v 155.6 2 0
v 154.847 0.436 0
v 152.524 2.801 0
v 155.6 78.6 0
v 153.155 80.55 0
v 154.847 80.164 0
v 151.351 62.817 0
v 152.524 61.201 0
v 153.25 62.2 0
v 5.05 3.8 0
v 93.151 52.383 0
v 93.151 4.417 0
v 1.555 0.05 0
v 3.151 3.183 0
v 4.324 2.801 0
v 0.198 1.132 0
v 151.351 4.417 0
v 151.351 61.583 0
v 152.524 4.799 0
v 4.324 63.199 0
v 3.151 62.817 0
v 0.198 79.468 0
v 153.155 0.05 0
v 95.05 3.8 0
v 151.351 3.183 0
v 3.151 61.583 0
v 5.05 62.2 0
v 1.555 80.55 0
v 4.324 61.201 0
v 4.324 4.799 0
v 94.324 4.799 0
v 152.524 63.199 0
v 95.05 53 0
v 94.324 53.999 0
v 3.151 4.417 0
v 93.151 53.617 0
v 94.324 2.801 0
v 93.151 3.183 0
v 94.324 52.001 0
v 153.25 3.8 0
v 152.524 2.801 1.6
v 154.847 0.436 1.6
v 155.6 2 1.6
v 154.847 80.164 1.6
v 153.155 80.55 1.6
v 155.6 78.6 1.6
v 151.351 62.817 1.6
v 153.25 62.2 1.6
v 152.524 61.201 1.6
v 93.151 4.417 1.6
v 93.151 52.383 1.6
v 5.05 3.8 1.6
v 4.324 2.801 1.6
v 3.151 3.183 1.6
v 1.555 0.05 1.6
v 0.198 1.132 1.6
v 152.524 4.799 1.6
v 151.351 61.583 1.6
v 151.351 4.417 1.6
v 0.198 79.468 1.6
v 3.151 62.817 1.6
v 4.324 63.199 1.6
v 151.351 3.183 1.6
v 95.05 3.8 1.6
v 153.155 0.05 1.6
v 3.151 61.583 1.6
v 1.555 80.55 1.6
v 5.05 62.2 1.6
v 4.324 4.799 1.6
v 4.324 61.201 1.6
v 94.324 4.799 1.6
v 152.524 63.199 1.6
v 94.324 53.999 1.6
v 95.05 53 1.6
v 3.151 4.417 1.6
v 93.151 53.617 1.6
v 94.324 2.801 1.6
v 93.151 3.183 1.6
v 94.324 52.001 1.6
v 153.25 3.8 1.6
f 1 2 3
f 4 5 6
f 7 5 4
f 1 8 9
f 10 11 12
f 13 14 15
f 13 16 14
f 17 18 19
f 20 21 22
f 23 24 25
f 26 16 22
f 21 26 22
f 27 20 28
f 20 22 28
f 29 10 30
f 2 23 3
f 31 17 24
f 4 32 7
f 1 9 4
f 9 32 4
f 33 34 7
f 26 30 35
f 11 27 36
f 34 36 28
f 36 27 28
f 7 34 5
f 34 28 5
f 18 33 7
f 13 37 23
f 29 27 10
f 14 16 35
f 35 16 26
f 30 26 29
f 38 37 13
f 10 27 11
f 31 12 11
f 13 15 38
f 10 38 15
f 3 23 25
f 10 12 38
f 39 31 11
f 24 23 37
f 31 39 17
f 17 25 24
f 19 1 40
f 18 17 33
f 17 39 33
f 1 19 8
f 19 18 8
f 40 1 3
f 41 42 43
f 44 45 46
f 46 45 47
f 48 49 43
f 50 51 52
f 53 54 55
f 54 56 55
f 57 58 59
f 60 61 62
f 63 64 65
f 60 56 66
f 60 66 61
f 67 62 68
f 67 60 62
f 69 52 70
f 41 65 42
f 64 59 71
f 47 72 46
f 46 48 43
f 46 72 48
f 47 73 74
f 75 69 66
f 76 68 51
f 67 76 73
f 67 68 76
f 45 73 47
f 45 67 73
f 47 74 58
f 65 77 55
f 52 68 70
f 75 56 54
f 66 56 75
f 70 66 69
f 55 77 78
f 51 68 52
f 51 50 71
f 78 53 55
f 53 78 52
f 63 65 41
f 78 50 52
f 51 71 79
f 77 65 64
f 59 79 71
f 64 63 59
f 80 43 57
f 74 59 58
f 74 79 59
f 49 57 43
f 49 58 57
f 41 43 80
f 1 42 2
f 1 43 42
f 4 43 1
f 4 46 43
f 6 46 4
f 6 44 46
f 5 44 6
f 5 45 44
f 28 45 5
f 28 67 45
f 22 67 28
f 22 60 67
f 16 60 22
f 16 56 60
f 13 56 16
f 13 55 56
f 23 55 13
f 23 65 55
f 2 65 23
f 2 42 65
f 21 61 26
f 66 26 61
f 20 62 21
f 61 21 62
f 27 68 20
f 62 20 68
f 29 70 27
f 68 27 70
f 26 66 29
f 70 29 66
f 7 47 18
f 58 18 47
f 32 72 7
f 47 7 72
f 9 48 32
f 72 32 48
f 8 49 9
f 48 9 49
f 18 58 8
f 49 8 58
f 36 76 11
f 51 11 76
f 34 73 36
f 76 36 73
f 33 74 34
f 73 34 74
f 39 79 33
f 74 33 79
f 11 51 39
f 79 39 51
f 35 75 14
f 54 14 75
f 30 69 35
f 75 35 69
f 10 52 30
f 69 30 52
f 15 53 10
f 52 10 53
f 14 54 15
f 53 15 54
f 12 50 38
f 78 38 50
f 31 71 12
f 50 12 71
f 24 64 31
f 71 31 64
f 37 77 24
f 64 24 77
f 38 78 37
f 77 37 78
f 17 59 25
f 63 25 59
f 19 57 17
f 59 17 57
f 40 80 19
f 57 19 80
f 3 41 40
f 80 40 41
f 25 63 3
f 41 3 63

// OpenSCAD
// file: nuts.scad
module rrect(w,l,r) {
    translate([r,r,0]) {
        minkowski() {
            square(size = [w-(2*r), l-(2*r)]);
            circle(r=r);
        }
    }
}

module nuthole_m2() {
    circle(d=2.1);
}

module nuthole_m25() {
    circle(d=2.6);
}

module nuthole_m3() {
    circle(d=3.15);
}
// main file
use <nuts.scad>

module radxa_x2l_holes() {
    translate([4, 3.8, 0]) nuthole_m2();
    translate([4, 3.8+58.4, 0]) nuthole_m2();
    translate([4+148.2-58.2, 3.8, 0]) nuthole_m2();
    translate([4+148.2-58.2, 3.8+49.2, 0]) nuthole_m2();
    translate([4+148.2, 3.8, 0]) nuthole_m2();
    translate([4+148.2, 3.8+58.4, 0]) nuthole_m2();
}

module radxa_x2l() {
    brd_thickness = 1.6;
    // precise measurements available at https://dl.radxa.com/x/x2l/radxa_x2l_product_brief.pdf
    linear_extrude(brd_thickness)
    difference() {
        rrect(155.6,80.6,2);
        radxa_x2l_holes();
    }
}

radxa_x2l();
